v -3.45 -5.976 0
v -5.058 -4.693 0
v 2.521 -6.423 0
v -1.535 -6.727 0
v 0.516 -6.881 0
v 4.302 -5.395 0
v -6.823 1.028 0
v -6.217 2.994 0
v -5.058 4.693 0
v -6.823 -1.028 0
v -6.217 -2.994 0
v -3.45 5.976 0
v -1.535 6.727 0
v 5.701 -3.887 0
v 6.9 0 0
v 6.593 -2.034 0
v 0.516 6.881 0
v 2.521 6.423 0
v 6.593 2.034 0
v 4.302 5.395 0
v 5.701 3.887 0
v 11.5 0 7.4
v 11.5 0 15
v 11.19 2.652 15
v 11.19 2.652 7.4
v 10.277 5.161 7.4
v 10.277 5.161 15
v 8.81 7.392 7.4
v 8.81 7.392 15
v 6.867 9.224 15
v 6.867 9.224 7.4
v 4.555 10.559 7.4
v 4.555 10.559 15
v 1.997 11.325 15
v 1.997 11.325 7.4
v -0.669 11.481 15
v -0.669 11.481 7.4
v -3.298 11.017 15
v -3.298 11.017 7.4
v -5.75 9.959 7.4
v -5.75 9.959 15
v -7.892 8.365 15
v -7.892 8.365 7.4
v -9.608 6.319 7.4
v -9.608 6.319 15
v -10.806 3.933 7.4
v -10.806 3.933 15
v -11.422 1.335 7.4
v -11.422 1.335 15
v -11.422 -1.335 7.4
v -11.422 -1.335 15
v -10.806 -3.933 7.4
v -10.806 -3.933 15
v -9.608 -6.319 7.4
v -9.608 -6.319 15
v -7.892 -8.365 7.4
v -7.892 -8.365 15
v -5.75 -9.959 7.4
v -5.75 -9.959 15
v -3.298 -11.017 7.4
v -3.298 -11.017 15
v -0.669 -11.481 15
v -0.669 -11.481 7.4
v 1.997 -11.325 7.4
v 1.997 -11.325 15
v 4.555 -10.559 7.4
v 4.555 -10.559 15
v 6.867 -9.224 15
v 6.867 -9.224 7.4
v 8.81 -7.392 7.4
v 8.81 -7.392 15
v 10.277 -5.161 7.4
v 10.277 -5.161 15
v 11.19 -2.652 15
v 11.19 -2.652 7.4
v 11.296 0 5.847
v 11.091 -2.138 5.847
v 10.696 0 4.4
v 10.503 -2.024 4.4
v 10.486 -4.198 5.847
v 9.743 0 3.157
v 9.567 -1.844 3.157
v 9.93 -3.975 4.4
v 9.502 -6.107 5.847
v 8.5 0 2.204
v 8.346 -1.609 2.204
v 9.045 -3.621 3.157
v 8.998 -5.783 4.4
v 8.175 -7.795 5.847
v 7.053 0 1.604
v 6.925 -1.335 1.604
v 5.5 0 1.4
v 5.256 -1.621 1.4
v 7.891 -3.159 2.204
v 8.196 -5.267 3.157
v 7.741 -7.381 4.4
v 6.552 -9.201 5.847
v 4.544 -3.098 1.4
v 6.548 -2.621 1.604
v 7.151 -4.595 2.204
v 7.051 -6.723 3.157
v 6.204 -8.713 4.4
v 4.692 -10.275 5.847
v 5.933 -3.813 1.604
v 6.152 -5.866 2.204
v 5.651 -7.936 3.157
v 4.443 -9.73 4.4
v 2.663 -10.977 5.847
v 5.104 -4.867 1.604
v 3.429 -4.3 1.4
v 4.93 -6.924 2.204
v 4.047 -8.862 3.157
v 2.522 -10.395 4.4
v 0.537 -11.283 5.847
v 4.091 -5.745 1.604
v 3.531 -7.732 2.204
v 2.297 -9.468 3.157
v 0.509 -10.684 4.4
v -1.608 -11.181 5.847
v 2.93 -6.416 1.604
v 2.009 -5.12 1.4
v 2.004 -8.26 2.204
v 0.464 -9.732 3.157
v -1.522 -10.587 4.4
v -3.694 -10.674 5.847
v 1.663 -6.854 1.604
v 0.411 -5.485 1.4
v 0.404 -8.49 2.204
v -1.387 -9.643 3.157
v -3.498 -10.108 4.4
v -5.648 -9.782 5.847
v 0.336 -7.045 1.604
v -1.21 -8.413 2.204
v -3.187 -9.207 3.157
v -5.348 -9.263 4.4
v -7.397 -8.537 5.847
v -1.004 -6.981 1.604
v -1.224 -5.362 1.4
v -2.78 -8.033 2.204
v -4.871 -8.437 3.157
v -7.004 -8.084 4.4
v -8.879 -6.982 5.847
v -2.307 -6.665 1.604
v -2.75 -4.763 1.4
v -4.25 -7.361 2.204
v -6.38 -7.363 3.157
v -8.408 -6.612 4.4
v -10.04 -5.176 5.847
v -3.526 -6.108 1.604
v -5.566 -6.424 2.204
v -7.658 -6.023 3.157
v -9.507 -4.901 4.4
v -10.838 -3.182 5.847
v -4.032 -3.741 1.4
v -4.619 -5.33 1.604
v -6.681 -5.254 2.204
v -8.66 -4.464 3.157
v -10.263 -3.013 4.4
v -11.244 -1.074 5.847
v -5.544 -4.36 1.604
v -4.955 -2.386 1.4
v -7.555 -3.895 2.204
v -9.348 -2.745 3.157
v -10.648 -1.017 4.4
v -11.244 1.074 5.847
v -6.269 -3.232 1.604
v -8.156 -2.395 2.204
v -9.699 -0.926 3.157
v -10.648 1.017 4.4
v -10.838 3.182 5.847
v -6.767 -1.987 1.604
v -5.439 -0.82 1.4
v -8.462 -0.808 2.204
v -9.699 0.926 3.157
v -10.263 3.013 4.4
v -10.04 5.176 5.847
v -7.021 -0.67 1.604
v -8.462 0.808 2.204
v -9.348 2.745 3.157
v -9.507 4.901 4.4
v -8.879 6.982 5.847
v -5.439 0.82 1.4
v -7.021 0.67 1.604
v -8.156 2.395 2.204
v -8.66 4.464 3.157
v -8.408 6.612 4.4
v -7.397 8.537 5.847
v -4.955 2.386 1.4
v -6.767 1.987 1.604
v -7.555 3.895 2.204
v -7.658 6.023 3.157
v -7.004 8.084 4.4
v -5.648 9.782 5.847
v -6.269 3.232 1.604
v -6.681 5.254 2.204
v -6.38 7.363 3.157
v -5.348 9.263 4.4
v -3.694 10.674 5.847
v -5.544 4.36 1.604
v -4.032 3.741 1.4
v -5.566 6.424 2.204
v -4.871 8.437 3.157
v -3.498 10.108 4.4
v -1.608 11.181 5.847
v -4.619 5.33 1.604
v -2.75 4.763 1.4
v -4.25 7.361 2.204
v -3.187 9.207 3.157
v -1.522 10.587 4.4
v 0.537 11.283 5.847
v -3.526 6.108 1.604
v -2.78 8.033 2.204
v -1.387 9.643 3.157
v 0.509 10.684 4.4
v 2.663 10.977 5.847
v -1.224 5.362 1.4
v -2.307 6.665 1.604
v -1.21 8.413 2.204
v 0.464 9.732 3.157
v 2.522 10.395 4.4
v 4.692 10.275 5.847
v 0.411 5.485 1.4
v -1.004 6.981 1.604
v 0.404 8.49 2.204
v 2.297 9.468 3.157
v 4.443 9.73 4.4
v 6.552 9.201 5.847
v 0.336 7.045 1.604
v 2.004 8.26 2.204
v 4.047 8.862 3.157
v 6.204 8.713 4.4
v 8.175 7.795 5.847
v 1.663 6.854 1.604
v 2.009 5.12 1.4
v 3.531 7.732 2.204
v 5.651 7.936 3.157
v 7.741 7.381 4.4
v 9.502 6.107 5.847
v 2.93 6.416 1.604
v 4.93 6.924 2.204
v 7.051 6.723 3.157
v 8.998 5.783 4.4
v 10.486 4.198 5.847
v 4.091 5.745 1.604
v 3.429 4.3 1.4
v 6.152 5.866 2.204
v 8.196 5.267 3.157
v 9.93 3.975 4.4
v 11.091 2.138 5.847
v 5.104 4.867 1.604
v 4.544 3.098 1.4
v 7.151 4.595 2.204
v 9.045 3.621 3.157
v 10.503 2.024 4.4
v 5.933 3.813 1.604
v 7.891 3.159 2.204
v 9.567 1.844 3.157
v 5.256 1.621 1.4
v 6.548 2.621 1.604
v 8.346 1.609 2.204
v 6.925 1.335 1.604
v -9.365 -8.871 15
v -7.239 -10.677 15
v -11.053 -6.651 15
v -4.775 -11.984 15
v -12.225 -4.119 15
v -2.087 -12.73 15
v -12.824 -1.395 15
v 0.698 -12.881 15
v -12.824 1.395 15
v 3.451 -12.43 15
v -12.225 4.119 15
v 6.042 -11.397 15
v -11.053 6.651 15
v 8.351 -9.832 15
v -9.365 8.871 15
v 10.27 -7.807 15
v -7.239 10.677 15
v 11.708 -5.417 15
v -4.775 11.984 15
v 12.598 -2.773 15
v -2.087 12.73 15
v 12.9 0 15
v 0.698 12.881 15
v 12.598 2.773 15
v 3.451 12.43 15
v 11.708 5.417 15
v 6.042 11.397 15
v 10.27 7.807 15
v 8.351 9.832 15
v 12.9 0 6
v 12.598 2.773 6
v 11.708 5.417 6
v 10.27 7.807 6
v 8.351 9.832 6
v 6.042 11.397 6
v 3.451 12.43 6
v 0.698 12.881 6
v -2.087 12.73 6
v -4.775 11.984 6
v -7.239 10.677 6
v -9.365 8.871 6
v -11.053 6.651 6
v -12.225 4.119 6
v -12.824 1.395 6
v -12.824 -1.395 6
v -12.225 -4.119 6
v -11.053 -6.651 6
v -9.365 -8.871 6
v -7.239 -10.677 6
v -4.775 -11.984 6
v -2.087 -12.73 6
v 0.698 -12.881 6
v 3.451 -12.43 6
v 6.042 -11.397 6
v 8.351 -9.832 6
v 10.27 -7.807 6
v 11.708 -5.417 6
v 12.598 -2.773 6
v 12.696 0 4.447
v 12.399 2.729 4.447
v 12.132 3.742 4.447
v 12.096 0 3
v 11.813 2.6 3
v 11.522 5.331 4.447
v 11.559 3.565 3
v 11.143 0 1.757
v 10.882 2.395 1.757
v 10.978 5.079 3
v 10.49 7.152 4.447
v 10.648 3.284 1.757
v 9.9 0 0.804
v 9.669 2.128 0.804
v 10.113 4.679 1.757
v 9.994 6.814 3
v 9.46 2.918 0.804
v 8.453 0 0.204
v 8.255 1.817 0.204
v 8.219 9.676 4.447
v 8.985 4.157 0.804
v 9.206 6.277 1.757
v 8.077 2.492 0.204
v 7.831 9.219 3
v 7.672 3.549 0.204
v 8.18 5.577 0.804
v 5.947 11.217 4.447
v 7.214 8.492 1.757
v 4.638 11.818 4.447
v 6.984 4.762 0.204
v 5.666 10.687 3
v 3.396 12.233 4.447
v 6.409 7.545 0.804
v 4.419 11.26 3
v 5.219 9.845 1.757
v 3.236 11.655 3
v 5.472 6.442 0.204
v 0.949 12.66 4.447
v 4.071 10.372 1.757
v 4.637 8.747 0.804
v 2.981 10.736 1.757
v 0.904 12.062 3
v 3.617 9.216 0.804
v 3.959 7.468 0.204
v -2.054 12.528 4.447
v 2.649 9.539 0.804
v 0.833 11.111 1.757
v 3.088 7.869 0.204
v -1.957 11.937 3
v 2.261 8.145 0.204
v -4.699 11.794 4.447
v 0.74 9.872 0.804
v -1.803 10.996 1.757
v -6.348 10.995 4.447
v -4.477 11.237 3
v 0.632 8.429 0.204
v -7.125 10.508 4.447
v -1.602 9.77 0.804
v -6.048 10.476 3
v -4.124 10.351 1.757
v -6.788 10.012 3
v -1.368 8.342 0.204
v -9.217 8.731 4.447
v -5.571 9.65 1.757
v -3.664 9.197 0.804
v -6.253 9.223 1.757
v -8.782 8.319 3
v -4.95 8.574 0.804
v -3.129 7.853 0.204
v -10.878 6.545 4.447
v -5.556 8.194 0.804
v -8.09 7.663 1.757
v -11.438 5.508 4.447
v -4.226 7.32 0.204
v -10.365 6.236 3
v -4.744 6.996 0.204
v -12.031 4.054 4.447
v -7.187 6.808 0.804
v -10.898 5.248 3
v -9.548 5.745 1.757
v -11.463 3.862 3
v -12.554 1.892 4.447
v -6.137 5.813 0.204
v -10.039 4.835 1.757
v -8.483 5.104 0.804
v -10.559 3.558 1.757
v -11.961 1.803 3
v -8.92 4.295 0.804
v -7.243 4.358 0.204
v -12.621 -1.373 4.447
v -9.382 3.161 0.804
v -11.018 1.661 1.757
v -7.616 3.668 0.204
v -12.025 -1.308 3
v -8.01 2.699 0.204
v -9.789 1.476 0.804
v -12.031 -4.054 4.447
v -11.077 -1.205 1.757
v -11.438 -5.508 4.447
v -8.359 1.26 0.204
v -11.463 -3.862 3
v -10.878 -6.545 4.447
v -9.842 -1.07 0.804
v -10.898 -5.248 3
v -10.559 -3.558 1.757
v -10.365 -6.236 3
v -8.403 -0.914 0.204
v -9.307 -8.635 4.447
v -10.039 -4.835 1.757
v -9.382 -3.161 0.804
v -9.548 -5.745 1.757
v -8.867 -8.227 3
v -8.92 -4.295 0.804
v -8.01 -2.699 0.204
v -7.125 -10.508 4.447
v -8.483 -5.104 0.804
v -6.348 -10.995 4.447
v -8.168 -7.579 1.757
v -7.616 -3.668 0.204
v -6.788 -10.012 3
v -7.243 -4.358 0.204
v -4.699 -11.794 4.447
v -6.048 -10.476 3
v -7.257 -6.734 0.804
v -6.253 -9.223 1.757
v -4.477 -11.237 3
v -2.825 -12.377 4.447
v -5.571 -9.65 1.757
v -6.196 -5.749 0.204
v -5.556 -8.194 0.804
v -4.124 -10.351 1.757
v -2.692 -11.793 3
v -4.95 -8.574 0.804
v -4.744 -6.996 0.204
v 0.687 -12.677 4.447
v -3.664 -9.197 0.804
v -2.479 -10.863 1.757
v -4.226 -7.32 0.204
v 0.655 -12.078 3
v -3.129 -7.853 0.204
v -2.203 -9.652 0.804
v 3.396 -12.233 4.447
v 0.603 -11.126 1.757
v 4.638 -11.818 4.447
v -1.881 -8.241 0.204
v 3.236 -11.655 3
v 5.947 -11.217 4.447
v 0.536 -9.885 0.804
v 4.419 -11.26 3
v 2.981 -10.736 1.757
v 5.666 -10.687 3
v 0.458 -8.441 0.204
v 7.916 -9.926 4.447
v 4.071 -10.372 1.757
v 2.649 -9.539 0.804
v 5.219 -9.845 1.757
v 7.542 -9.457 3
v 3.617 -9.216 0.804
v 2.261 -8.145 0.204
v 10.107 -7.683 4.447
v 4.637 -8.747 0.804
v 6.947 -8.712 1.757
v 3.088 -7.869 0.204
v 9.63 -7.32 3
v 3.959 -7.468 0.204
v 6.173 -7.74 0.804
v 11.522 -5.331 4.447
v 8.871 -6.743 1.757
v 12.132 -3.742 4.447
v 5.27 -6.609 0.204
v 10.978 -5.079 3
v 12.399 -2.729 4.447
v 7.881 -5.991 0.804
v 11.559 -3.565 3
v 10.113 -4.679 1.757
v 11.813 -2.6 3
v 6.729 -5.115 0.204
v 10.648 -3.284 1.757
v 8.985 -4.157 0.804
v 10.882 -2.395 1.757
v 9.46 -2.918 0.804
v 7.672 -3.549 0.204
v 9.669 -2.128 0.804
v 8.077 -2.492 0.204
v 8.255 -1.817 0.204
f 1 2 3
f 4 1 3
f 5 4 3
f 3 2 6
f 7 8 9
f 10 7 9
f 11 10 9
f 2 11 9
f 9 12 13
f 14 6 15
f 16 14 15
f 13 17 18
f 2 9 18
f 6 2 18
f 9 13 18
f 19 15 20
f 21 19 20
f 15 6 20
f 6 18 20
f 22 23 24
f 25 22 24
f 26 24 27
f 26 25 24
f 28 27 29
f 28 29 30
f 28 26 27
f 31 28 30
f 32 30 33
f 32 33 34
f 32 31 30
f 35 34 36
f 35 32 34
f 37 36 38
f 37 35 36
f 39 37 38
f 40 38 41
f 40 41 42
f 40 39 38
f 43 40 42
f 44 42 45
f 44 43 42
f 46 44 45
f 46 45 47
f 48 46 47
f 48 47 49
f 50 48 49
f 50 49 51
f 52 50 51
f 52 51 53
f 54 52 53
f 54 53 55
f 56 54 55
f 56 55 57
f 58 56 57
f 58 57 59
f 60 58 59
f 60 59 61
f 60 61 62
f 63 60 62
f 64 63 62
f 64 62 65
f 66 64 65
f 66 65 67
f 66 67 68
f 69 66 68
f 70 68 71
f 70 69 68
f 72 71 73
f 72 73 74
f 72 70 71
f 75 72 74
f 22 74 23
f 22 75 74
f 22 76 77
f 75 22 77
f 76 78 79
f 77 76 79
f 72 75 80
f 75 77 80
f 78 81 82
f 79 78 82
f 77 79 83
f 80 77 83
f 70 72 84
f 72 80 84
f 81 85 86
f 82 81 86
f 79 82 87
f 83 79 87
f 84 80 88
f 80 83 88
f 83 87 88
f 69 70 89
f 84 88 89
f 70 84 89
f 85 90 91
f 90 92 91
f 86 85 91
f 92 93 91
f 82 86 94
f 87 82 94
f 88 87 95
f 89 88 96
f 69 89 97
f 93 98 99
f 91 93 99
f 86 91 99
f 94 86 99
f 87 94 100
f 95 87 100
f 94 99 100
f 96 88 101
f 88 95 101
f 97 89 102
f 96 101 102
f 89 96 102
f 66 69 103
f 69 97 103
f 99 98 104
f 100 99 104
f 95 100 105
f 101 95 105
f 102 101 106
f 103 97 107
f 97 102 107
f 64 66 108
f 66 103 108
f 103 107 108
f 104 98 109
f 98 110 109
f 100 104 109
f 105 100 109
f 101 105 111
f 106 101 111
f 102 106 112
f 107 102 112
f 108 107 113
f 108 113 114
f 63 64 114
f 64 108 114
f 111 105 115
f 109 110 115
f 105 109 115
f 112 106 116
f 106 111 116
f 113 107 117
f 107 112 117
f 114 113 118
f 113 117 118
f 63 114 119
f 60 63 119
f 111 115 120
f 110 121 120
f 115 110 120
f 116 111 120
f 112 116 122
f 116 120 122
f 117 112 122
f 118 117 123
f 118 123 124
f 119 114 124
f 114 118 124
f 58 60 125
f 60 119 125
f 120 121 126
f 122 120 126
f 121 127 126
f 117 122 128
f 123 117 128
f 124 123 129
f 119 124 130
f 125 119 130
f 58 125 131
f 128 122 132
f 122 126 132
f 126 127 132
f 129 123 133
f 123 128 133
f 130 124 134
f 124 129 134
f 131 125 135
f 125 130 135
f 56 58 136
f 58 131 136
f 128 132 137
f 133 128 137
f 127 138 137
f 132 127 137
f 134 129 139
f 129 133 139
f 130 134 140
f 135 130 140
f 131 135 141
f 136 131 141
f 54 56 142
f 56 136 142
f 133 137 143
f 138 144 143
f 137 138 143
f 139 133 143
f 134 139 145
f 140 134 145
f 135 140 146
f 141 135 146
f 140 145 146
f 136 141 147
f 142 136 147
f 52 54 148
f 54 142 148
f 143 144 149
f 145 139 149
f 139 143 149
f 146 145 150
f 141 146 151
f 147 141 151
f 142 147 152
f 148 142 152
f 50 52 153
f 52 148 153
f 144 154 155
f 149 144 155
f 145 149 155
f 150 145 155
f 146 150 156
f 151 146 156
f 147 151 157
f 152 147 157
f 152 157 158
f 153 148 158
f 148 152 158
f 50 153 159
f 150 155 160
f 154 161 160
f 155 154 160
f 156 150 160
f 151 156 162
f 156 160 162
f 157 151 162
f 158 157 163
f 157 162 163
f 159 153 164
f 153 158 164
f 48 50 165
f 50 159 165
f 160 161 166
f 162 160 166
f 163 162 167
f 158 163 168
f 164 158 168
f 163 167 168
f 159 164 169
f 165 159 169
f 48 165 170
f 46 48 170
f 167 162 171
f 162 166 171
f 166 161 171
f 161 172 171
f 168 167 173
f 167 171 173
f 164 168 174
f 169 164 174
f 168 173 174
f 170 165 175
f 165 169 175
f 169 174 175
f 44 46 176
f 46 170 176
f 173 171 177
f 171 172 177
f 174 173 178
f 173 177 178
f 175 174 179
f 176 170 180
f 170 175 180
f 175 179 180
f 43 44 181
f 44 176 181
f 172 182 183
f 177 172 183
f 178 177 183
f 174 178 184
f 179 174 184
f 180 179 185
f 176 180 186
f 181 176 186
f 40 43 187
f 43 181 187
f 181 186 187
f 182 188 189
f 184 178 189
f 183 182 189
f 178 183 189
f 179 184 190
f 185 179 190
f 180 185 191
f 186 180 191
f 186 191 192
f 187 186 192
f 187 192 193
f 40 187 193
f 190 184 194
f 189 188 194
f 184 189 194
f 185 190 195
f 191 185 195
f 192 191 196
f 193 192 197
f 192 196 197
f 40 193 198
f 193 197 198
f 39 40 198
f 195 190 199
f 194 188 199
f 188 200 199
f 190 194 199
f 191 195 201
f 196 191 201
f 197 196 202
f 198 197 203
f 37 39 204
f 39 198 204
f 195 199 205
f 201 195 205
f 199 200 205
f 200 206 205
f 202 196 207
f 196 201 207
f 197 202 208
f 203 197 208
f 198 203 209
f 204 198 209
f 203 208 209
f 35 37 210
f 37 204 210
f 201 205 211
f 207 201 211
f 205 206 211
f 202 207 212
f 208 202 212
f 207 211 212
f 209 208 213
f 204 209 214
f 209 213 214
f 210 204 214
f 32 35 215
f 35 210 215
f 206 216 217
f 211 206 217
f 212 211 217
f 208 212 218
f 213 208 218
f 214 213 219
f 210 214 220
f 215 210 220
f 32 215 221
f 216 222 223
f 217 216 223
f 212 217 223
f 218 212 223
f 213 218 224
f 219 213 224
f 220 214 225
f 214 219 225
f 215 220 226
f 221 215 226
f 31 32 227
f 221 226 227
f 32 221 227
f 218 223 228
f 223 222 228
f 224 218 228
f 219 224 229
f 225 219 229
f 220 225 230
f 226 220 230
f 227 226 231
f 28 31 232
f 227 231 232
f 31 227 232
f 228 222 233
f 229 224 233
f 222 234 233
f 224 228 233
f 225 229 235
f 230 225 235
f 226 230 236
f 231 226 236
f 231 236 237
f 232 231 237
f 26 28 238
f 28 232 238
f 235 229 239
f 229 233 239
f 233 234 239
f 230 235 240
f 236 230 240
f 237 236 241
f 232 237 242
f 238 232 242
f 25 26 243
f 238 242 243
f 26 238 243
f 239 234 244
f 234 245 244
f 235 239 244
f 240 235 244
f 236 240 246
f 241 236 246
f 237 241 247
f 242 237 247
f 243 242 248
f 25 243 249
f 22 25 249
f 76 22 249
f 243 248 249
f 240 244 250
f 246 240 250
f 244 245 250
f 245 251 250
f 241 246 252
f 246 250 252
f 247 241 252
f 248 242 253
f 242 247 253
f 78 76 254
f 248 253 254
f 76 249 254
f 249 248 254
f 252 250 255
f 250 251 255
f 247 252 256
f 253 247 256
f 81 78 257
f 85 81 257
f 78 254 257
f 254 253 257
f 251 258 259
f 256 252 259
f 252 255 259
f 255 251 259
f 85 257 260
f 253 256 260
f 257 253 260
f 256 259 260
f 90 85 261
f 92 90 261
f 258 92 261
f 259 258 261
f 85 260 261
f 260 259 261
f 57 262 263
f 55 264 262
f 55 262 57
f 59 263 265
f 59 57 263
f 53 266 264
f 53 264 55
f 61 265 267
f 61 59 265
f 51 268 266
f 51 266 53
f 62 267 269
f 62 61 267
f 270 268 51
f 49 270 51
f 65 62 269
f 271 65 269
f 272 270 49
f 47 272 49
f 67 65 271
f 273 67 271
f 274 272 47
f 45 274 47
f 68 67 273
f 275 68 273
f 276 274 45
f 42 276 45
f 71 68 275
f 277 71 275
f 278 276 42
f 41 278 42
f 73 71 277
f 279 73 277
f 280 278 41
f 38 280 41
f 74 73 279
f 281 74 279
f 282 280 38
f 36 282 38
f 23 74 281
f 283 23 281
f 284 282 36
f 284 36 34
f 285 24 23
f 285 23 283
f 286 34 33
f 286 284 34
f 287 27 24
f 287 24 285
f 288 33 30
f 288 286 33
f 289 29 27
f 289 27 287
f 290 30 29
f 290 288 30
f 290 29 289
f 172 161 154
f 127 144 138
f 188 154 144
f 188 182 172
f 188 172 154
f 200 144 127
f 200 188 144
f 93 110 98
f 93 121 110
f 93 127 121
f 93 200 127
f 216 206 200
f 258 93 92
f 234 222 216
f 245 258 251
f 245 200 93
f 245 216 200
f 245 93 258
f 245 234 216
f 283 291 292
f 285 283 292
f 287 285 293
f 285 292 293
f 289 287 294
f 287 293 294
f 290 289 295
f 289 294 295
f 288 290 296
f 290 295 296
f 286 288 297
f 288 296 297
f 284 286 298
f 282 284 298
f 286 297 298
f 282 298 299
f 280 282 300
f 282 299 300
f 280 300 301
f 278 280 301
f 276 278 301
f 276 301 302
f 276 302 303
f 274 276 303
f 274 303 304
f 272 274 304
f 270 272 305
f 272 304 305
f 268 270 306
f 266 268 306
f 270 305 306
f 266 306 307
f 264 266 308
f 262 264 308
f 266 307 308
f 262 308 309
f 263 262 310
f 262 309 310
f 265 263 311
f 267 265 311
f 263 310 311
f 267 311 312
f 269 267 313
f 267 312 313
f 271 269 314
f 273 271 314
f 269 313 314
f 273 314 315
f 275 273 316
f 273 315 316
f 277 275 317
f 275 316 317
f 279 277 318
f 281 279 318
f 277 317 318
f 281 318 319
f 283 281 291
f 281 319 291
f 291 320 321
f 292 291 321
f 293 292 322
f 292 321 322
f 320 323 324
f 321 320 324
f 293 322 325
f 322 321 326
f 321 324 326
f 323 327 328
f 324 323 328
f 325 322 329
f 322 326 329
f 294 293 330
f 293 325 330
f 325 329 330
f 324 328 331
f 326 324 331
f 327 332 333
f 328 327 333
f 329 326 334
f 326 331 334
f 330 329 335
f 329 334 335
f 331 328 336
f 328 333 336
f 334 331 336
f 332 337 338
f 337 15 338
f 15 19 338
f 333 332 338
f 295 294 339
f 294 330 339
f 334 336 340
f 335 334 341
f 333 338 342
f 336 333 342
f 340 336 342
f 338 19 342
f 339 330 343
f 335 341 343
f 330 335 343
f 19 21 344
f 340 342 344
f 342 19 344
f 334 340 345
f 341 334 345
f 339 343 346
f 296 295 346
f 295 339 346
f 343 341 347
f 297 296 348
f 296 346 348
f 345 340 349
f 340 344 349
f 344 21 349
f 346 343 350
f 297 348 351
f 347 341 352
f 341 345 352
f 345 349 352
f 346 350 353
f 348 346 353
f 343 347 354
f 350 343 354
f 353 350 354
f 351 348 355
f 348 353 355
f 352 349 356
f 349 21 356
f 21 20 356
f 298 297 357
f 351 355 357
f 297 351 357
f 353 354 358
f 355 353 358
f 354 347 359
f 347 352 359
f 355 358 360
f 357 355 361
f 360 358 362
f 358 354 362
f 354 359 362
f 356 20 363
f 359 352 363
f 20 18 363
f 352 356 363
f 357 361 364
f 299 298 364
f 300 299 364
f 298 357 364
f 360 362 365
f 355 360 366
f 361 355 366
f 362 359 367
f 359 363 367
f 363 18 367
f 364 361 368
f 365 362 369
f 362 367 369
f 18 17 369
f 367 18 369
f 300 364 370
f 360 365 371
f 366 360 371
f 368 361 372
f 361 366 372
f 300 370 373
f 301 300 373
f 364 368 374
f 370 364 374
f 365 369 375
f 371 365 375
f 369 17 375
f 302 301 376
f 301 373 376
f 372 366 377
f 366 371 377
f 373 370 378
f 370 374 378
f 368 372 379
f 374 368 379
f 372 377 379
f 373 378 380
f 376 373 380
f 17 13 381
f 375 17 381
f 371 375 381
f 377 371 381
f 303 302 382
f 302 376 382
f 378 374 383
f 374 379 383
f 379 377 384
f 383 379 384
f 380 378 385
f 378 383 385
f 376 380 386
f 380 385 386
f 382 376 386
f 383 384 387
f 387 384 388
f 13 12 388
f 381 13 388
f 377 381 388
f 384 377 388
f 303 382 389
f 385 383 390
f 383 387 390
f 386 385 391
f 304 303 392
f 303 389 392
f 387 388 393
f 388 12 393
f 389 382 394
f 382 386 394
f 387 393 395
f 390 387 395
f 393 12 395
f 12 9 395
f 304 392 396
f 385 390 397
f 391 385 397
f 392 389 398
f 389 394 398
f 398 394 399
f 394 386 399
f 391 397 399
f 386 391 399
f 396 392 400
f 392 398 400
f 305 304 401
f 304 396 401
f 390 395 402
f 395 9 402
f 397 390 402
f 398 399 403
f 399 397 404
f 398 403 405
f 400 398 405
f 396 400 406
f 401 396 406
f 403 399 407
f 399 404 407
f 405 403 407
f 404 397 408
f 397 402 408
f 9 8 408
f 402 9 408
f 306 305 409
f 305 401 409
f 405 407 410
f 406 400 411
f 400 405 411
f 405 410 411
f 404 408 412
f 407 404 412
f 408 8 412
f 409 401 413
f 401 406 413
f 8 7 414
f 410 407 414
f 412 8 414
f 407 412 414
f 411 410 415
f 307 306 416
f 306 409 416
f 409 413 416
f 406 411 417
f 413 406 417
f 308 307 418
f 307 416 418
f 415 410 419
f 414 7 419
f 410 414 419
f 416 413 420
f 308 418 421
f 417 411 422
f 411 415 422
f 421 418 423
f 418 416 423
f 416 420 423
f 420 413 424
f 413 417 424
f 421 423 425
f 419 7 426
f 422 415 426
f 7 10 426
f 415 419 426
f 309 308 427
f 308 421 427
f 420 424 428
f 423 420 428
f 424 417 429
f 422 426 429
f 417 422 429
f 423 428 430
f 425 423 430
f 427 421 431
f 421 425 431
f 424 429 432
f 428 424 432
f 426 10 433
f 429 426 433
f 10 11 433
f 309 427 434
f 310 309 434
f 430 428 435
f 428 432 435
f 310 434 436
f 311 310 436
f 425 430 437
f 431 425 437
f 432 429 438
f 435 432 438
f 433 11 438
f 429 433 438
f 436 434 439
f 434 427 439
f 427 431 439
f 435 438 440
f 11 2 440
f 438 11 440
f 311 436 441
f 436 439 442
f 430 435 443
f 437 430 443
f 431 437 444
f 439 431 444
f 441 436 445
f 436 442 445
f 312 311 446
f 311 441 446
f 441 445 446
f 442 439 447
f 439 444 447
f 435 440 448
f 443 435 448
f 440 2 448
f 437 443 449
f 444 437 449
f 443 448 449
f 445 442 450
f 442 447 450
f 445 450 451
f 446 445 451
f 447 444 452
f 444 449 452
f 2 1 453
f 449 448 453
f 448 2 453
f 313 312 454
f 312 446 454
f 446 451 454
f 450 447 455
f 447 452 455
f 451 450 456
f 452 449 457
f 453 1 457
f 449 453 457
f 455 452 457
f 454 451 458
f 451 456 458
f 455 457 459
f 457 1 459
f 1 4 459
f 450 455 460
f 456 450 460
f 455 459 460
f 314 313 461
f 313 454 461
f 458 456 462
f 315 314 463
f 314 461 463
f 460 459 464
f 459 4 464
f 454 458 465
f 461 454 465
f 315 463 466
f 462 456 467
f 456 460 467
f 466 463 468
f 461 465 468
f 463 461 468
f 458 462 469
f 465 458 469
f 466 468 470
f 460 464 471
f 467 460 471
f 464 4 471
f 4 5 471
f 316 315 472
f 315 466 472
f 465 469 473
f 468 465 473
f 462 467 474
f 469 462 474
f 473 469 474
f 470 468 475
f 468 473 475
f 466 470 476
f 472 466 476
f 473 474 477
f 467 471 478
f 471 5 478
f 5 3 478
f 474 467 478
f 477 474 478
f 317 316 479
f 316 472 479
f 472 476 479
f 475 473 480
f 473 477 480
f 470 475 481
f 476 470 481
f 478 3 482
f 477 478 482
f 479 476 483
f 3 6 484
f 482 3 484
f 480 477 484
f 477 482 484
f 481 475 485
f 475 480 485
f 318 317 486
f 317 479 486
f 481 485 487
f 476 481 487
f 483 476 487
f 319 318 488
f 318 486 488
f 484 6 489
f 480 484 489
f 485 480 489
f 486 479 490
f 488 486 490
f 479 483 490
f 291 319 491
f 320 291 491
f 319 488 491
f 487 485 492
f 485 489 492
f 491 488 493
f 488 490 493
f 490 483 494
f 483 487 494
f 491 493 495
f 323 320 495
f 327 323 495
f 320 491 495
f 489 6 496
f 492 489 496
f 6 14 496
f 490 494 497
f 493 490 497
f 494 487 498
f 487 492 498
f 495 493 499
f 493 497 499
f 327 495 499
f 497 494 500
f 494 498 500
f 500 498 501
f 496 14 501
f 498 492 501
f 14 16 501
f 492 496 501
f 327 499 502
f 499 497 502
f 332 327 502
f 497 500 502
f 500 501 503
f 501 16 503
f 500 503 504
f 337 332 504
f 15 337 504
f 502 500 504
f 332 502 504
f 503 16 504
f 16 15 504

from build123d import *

# Parameters (mm, degrees)
F0_R     = 12.9
F1_DEPTH = 15
F2_T     = -1.4
F3_R     = 6


with BuildPart() as f1:
    # F0 (on Top) → F1 (new body)
    with BuildSketch(Plane.XY):
        Circle(F0_R)
    extrude(amount=F1_DEPTH)

    # F2
    f2_openings = [f1.faces().sort_by_distance(p)[0] for p in [
        (0, 0, 15),
    ]]
    offset(amount=F2_T, openings=f2_openings)

    # F3
    f3_edges = [f1.edges().sort_by_distance(p)[0] for p in [
        (-11.5, 0, 1.4),
        (-12.9, 0, 0),
    ]]
    fillet(f3_edges, radius=F3_R)


solid = f1.part
